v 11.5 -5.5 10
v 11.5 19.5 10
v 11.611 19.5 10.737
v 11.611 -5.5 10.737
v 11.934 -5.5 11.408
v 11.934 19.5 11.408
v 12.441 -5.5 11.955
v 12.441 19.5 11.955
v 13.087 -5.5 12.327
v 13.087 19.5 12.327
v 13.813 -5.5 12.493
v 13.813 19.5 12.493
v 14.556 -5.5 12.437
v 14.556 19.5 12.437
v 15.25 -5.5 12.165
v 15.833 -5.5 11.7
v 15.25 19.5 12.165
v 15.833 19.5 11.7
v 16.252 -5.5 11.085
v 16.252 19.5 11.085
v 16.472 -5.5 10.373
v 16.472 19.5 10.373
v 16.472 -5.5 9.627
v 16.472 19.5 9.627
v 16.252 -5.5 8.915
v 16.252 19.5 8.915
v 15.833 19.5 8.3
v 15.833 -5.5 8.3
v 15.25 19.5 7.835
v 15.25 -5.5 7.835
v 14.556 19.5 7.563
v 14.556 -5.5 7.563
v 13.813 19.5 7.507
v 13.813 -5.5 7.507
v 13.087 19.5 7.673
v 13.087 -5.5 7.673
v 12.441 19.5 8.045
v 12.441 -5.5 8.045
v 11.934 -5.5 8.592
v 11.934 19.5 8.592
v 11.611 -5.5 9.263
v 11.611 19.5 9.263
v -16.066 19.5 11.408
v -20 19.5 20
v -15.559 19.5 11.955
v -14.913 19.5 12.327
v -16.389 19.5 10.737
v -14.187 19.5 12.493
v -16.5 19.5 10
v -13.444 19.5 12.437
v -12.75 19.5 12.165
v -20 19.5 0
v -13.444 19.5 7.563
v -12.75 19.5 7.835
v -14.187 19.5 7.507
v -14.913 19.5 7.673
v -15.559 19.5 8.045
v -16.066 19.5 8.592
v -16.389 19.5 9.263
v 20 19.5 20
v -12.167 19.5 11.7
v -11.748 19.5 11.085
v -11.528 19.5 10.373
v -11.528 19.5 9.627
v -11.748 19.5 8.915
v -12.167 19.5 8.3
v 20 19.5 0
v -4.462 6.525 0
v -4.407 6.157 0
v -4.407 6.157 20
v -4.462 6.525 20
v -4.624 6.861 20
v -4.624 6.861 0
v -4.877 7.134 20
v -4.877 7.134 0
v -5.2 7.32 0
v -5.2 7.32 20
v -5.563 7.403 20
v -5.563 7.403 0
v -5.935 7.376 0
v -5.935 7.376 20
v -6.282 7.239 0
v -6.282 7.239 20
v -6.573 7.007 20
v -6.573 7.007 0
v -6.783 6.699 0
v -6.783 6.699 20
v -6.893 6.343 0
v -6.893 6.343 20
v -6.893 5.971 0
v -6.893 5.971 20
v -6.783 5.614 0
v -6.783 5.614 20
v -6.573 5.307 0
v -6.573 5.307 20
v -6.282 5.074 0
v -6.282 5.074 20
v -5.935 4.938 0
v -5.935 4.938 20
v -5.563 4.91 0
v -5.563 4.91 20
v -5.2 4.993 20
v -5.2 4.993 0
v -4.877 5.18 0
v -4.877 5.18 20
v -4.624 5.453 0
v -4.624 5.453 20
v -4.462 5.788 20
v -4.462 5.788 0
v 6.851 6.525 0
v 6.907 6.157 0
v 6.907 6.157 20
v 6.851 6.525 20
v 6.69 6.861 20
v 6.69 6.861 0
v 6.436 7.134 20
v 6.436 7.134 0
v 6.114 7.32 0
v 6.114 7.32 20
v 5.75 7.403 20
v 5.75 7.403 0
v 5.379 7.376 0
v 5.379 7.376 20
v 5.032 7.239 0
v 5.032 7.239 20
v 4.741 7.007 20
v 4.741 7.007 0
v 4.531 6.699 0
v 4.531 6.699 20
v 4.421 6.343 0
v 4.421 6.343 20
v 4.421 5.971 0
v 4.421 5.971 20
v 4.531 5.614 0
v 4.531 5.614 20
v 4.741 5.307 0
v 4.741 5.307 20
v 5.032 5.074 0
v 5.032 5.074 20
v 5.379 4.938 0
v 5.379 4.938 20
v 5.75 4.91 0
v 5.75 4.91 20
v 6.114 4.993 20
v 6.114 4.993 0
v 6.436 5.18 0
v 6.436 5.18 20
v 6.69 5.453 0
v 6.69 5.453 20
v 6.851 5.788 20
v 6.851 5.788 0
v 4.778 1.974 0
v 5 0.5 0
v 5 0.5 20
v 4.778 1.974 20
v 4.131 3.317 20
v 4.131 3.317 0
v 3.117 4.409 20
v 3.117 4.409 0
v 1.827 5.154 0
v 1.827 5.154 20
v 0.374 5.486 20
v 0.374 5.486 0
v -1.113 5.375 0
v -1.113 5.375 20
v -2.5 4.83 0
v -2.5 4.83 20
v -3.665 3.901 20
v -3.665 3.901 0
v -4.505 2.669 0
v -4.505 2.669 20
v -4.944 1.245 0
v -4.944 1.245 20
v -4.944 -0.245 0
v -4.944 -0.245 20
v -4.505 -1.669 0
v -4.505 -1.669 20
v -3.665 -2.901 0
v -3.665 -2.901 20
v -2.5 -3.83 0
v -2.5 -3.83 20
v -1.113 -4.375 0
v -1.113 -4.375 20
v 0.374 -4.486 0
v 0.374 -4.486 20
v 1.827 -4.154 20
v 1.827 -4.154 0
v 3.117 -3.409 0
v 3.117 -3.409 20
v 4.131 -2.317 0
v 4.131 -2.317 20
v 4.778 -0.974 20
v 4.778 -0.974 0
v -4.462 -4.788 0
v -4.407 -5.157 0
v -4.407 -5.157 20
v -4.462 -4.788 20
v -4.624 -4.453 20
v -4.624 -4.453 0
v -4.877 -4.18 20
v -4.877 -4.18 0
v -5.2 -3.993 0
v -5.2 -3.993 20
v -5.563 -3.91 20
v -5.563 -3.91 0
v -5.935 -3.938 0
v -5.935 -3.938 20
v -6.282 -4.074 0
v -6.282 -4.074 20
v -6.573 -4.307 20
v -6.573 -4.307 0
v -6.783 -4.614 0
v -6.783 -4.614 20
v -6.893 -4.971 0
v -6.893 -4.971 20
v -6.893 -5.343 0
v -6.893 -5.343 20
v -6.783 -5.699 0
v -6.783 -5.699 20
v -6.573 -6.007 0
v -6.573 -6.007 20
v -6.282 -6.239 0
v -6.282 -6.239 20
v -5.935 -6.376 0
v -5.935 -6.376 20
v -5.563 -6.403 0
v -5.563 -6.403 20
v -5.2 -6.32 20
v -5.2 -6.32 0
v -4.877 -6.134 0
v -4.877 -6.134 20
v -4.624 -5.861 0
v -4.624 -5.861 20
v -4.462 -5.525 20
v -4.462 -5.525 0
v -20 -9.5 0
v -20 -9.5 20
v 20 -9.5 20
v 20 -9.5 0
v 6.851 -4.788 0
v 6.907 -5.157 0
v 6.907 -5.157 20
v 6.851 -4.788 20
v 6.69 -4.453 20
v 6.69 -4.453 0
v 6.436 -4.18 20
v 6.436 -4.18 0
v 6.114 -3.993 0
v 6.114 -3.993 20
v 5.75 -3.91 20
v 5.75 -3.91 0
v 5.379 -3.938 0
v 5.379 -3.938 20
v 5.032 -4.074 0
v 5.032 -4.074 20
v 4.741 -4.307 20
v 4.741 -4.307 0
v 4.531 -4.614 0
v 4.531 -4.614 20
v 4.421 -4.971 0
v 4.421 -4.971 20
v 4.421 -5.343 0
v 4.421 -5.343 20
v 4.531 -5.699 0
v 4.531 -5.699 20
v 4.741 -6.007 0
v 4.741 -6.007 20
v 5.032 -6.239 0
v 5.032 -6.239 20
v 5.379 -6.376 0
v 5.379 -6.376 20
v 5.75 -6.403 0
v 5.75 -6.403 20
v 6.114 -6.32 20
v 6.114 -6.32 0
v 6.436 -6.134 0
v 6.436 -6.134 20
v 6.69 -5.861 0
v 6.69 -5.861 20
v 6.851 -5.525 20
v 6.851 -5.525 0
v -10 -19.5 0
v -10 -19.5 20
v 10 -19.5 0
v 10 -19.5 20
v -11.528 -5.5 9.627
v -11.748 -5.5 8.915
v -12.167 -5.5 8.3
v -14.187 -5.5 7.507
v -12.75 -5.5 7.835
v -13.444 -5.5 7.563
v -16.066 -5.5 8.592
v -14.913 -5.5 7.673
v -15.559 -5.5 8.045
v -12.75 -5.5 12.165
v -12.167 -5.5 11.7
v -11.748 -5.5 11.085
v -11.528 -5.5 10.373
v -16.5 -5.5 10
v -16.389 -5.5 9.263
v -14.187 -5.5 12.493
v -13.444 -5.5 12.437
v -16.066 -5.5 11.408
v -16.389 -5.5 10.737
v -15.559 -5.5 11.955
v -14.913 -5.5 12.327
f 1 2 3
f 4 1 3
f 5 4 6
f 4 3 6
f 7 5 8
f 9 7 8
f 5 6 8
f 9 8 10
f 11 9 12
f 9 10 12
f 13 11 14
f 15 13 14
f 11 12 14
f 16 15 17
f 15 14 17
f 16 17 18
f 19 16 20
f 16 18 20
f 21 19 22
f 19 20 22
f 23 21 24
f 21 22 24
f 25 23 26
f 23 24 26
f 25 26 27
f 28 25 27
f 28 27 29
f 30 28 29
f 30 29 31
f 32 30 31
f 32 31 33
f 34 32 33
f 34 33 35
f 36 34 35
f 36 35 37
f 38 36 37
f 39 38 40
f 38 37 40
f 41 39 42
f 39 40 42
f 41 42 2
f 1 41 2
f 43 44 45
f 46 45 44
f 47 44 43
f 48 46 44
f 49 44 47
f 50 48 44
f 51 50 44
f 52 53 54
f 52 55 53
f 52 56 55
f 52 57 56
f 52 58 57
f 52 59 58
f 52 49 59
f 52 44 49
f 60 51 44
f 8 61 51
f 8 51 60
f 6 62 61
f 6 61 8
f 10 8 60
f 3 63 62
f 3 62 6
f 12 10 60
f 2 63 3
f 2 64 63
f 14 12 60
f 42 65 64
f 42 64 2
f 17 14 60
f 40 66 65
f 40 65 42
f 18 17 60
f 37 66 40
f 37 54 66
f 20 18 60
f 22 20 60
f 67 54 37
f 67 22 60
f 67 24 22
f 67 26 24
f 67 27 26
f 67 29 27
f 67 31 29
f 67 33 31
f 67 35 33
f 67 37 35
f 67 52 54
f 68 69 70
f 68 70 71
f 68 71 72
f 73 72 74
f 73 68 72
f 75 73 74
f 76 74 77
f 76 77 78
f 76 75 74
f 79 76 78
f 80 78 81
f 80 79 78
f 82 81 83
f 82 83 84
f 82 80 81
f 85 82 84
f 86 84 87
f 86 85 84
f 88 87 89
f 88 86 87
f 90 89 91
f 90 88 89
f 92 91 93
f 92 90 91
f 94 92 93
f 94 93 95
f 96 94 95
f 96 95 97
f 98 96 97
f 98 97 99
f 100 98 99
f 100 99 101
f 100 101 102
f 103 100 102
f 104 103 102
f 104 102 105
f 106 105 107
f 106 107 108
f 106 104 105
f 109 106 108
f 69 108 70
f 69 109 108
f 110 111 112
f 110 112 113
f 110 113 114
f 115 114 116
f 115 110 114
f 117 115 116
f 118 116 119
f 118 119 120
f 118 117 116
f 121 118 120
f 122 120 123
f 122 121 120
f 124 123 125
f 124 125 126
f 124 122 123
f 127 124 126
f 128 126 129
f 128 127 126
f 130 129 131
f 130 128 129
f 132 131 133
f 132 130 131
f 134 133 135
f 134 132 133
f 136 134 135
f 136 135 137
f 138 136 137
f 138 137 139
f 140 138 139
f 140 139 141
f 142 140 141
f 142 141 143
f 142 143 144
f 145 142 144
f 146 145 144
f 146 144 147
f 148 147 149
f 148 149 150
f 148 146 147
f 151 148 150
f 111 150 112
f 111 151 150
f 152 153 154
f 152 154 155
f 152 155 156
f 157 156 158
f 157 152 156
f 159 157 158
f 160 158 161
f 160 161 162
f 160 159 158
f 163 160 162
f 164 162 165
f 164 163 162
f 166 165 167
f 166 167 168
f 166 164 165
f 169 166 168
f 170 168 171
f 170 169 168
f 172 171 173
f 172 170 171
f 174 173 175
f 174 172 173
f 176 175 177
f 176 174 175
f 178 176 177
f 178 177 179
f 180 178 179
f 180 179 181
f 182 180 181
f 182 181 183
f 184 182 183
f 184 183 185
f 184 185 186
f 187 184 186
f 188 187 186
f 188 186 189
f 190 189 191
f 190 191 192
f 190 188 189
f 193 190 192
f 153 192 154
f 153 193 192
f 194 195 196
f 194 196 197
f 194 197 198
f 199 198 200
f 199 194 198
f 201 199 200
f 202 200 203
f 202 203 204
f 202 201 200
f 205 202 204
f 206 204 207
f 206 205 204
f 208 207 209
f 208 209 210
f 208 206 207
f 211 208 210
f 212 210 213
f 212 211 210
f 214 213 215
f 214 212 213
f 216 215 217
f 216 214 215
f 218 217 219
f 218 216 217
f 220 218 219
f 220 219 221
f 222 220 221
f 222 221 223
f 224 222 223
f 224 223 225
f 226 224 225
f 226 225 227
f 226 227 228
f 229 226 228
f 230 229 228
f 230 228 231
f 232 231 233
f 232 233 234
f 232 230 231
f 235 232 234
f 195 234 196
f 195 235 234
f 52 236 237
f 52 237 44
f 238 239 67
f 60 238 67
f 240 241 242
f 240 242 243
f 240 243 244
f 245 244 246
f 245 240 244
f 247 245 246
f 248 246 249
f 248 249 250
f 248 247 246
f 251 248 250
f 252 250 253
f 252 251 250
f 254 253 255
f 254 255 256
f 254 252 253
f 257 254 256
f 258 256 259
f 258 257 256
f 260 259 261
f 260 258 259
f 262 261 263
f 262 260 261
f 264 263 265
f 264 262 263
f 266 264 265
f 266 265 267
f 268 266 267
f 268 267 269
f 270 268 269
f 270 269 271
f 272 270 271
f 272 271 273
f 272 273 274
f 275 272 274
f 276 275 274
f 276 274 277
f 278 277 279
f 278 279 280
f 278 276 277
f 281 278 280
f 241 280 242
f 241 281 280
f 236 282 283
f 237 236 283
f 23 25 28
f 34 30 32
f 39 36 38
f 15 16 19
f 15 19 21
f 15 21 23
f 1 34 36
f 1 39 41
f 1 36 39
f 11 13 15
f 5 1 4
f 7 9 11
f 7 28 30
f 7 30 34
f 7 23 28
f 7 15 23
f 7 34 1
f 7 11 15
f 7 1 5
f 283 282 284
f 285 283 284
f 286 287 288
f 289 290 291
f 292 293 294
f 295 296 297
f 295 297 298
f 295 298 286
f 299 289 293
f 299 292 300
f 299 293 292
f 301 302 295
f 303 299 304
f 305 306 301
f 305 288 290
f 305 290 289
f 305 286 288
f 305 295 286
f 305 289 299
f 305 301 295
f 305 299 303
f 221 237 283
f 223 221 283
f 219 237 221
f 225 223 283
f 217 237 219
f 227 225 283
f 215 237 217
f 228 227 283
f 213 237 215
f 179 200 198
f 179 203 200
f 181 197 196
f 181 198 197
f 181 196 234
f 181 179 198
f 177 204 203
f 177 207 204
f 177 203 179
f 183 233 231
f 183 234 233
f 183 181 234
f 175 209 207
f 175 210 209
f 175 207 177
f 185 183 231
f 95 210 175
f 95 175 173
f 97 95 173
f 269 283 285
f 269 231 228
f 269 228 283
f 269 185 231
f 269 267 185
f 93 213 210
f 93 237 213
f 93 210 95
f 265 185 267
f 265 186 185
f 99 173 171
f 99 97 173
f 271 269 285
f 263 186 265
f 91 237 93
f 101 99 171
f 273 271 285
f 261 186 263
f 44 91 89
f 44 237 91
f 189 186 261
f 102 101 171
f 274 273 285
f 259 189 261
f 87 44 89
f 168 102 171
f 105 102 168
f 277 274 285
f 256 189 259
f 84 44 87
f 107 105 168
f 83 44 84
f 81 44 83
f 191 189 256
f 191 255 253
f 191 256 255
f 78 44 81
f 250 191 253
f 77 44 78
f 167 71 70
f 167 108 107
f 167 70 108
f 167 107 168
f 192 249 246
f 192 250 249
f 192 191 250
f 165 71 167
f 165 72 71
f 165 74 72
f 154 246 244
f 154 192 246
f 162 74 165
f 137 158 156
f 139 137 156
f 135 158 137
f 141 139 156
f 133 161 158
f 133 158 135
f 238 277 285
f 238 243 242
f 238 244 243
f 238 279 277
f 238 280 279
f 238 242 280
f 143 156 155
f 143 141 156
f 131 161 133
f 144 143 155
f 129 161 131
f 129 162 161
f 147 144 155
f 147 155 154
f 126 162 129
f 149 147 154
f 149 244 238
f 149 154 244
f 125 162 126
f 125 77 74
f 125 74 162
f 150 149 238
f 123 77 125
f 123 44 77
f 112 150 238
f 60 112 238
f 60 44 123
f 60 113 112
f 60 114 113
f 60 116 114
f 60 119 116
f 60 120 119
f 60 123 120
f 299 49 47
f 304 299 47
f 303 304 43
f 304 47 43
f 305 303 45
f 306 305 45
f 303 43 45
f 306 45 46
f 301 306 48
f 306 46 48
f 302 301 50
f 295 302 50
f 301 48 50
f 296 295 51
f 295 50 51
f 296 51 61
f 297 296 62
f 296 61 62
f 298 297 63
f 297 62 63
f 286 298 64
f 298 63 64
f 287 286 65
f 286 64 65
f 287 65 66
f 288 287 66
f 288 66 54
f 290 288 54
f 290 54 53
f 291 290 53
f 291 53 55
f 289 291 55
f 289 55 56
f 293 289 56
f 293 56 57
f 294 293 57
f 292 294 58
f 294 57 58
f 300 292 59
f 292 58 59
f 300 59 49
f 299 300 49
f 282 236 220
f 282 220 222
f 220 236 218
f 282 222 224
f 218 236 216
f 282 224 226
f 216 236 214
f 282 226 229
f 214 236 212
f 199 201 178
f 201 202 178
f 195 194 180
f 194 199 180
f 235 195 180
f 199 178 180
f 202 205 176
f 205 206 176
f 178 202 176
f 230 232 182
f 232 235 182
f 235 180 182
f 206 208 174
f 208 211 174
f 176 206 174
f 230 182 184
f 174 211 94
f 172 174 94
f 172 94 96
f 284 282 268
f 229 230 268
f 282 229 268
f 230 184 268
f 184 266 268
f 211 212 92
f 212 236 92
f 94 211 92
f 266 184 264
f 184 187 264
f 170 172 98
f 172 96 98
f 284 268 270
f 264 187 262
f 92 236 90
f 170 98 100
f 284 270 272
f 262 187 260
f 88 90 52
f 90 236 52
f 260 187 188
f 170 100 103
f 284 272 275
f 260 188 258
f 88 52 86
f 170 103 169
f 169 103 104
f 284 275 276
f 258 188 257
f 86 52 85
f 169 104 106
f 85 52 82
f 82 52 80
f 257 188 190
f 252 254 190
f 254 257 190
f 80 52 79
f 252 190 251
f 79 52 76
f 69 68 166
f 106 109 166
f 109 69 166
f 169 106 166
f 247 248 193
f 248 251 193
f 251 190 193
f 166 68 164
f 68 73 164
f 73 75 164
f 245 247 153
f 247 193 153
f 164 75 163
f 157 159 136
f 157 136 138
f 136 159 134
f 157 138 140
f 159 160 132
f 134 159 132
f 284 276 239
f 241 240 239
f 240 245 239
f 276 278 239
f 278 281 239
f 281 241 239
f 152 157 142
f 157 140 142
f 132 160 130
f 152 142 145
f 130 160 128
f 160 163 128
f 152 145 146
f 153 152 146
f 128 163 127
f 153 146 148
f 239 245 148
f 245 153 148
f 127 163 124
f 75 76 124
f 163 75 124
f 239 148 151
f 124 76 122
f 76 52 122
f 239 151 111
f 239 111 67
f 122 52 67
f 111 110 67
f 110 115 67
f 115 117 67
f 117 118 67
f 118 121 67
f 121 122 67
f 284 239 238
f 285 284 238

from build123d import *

# Parameters (mm, degrees)
F0_W     = 40
F0_H     = 39
F0_R     = 1.25
F0_R_2   = 5
F1_DEPTH = 20
F2_SIZE  = 10
F3_R     = 2.5
F4_DEPTH = 25


with BuildPart() as f1:
    # F0 (on Top) → F1 (new body)
    with BuildSketch(Plane.XY):
        Rectangle(F0_W, F0_H)
        with Locations((-5.656854, -5.156854)):
            Circle(F0_R, mode=Mode.SUBTRACT)
        with Locations((5.656854, -5.156854)):
            Circle(F0_R, mode=Mode.SUBTRACT)
        with Locations((-5.656854, 6.156854)):
            Circle(F0_R, mode=Mode.SUBTRACT)
        with Locations((0, 0.5)):
            Circle(F0_R_2, mode=Mode.SUBTRACT)
        with Locations((5.656854, 6.156854)):
            Circle(F0_R, mode=Mode.SUBTRACT)
    extrude(amount=F1_DEPTH)

    # F2
    f2_edges = [f1.edges().sort_by_distance(p)[0] for p in [
        (-20, -19.5, 10),
        (20, -19.5, 10),
    ]]
    chamfer(f2_edges, length=F2_SIZE)

    # F3 (on face) → F4 (cut)
    with BuildSketch(Plane(origin=(0, 19.5, 0), x_dir=(-1, 0, 0), z_dir=(0, 1, 0))):
        with Locations((14, 10)):
            Circle(F3_R)
        with Locations((-14, 10)):
            Circle(F3_R)
    extrude(amount=-F4_DEPTH, mode=Mode.SUBTRACT)


solid = f1.part
